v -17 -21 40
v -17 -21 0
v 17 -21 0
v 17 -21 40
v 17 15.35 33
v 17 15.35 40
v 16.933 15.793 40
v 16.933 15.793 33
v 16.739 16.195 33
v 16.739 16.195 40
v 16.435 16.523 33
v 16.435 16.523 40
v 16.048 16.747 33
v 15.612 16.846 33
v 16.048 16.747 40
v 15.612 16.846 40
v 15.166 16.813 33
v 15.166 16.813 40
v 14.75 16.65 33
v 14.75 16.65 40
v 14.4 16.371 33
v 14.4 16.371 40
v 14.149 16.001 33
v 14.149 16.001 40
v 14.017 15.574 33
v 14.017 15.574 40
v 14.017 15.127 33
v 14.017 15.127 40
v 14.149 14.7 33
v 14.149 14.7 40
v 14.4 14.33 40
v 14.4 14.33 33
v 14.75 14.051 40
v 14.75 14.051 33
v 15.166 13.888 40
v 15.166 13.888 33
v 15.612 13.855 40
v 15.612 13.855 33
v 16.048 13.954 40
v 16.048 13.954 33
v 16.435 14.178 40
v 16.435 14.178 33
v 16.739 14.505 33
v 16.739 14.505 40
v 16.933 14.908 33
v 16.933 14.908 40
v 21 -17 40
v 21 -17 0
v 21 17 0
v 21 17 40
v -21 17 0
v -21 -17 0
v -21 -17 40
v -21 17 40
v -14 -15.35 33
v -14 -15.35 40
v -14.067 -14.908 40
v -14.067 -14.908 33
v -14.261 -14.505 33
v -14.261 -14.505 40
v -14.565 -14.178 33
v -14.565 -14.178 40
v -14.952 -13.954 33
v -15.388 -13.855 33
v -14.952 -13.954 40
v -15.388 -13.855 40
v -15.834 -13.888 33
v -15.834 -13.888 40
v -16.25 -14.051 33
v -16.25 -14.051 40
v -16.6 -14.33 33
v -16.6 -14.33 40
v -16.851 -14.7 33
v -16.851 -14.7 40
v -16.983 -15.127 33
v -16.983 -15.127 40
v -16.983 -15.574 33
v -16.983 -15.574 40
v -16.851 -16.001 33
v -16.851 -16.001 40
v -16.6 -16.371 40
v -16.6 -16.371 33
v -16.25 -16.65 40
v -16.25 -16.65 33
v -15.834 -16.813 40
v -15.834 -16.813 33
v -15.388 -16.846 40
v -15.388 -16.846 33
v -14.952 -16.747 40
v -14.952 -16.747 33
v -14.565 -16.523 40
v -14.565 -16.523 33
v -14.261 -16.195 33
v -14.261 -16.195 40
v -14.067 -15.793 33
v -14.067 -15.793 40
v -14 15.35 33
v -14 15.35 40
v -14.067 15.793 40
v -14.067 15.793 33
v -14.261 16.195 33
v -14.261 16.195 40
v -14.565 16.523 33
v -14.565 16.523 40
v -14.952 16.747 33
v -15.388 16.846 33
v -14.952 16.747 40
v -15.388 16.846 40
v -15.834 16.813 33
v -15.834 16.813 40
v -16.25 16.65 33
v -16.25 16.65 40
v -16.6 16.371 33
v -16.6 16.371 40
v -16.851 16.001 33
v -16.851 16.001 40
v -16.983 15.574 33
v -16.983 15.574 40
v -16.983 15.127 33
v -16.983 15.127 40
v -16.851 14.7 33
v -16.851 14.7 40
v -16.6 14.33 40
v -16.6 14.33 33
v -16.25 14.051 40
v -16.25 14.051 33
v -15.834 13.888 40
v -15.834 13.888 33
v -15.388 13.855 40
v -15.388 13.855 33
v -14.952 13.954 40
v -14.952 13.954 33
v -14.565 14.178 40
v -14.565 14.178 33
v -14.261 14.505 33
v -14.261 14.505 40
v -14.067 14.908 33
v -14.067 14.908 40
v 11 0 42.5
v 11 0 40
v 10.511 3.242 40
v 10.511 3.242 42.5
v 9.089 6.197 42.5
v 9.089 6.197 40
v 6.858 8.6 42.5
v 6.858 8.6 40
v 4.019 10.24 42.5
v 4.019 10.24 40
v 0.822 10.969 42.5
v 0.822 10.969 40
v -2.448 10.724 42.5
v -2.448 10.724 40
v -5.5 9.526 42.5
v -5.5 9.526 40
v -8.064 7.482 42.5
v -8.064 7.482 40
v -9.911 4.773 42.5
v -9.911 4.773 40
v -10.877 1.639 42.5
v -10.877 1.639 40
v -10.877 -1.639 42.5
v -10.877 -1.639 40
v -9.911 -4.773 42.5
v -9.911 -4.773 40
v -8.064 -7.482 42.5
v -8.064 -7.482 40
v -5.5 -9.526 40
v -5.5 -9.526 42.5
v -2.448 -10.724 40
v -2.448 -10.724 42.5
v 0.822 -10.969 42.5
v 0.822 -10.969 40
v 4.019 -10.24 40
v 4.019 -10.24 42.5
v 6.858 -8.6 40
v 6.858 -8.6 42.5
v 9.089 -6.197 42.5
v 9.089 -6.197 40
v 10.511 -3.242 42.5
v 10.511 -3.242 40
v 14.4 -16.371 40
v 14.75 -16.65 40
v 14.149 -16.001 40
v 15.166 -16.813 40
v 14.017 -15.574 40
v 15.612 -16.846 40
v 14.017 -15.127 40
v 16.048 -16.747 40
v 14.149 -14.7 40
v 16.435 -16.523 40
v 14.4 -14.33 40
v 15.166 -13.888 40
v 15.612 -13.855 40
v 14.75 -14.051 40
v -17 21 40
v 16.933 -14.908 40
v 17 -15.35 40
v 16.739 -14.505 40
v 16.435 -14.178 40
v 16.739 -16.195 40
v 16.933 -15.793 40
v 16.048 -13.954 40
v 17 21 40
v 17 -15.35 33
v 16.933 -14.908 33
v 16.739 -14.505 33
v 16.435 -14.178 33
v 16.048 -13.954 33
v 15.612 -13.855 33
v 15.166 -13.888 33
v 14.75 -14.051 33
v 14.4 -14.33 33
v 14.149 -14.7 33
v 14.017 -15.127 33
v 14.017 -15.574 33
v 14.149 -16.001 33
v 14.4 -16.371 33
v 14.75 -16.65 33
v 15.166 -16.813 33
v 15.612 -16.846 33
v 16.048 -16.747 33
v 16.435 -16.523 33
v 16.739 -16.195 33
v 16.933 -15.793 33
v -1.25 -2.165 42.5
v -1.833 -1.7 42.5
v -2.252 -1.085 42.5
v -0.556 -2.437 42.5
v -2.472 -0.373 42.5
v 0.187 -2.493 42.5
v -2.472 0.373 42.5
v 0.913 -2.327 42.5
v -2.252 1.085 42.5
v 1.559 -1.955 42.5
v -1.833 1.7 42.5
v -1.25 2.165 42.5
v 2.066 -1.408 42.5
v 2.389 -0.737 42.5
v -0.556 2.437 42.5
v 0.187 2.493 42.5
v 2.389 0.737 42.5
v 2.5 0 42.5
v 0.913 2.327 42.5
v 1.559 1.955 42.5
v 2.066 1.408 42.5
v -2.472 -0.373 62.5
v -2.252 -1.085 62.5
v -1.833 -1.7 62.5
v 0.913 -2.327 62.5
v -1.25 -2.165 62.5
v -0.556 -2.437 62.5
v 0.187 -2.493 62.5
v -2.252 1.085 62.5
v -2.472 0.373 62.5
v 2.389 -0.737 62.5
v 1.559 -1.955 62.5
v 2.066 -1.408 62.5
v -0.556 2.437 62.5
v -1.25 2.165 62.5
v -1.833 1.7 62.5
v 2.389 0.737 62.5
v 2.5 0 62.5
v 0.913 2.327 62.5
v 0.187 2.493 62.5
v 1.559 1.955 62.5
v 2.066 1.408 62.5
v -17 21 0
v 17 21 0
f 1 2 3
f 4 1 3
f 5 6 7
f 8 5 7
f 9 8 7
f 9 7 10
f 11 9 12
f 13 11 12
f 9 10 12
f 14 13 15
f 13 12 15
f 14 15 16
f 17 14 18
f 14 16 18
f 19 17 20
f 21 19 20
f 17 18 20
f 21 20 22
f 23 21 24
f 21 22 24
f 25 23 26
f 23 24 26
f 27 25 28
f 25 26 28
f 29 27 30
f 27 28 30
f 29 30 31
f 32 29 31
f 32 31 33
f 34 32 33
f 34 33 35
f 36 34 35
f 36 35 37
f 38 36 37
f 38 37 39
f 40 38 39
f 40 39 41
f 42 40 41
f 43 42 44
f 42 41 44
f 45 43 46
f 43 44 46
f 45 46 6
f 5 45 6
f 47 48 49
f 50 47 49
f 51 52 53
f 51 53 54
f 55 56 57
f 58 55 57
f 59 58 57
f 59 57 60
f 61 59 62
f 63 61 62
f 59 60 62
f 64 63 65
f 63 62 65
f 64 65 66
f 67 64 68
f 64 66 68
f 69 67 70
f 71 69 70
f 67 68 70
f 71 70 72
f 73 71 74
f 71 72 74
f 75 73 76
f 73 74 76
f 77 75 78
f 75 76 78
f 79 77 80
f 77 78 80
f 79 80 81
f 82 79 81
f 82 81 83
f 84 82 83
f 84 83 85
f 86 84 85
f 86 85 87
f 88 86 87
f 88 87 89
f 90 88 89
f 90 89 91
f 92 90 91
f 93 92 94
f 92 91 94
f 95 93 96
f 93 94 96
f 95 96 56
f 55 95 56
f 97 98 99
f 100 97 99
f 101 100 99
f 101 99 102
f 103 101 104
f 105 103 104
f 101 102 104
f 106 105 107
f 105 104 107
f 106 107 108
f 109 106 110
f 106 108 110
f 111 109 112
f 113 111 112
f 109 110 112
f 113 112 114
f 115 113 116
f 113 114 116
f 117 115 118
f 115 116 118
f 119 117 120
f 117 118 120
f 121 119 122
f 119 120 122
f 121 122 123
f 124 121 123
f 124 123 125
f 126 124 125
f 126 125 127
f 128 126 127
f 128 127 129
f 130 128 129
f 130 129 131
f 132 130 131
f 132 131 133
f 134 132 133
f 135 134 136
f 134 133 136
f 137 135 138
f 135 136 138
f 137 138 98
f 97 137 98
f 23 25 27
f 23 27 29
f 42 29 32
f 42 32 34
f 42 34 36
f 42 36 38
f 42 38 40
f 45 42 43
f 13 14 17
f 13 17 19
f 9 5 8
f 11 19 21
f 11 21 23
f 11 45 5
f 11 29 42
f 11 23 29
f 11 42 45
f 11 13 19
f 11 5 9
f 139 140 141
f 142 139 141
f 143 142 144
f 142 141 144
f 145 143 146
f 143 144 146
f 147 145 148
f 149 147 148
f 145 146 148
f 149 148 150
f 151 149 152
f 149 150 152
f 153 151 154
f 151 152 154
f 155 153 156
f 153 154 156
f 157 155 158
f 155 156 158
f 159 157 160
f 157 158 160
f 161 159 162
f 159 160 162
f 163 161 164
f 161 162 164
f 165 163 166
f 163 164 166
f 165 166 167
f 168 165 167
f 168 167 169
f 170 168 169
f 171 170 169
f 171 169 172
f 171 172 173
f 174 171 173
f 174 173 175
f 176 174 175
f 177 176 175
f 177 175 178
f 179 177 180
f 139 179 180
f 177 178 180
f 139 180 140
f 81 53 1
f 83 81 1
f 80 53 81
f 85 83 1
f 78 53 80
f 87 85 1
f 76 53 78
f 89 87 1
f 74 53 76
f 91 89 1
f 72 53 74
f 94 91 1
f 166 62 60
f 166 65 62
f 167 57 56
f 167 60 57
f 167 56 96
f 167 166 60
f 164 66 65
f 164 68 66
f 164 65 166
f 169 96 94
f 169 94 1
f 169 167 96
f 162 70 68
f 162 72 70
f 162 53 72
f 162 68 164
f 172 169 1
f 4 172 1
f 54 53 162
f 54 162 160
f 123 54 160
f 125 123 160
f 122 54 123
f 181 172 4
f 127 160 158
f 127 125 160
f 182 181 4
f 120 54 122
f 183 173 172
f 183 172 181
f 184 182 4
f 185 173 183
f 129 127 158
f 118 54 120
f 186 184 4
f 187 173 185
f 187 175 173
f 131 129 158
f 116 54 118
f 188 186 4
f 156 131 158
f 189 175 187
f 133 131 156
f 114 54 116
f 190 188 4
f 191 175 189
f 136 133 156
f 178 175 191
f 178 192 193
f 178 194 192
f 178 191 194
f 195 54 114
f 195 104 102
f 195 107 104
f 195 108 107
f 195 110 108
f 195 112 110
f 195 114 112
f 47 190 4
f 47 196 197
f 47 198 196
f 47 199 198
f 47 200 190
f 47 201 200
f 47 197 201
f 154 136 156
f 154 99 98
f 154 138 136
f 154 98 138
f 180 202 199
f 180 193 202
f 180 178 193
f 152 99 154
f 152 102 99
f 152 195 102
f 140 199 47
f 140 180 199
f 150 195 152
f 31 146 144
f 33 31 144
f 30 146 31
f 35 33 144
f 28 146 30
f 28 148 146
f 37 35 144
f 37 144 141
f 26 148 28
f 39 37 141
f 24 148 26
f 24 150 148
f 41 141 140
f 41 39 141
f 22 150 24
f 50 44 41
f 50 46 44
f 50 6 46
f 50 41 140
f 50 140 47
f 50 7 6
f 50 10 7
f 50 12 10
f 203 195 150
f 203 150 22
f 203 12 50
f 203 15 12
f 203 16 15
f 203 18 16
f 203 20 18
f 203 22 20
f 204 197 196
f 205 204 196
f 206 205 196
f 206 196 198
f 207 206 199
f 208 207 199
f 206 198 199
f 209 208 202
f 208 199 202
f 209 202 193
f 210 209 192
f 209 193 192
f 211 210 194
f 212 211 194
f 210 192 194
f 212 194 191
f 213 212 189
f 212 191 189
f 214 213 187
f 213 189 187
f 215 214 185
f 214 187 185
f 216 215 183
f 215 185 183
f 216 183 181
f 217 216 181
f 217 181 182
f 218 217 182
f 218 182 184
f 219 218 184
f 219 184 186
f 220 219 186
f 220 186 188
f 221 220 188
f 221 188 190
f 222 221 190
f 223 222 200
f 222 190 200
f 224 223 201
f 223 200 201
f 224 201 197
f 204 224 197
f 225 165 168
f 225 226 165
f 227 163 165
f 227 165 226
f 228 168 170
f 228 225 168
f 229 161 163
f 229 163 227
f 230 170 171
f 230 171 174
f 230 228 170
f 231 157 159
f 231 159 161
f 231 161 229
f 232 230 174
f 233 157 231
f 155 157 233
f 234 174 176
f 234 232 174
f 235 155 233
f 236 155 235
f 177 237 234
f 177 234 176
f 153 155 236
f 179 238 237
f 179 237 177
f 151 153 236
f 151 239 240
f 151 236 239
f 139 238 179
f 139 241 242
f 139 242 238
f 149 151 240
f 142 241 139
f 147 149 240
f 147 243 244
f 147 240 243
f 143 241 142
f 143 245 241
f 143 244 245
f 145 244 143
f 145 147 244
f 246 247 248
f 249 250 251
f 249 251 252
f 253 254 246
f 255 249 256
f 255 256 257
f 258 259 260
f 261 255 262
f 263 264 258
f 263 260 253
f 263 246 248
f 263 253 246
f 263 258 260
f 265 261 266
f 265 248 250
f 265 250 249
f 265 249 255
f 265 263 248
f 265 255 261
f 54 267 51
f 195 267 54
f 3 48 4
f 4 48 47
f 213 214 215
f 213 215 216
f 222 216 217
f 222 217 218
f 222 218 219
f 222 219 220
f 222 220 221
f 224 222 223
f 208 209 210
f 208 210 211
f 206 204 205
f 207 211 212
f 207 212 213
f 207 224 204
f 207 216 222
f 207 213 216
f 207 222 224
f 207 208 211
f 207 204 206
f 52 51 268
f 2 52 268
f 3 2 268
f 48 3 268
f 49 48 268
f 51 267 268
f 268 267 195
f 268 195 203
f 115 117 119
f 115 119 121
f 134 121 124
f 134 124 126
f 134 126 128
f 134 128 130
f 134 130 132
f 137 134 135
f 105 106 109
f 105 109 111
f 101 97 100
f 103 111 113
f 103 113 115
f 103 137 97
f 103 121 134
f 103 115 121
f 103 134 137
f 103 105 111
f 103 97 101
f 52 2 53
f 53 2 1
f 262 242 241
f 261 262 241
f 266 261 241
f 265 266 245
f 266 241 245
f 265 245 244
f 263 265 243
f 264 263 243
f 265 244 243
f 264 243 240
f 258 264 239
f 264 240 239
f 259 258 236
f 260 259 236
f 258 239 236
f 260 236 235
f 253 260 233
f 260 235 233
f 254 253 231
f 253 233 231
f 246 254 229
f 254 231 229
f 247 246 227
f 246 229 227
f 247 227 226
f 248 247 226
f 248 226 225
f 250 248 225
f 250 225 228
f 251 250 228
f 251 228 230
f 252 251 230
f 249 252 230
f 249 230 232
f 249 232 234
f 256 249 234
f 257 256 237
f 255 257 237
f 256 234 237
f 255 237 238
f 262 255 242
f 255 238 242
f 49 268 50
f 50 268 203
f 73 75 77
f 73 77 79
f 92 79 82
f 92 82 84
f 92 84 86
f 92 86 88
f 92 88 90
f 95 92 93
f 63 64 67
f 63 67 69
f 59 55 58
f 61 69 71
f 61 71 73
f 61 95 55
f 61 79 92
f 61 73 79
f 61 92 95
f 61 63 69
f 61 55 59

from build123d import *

# Parameters (mm, degrees)
SKETCH_W     = 42
SKETCH_H     = 42
PAD_DEPTH    = 40
CHAMFER_SIZE = 4
SKETCH001_R  = 11
PAD001_DEPTH = 2.5
SKETCH002_R  = 2.5
PAD002_DEPTH = 20
SKETCH003_R  = 1.5
POCKET_DEPTH = 7


with BuildPart() as part:
    # Sketch → Pad (new body)
    with BuildSketch(Plane.XY):
        Rectangle(SKETCH_W, SKETCH_H)
    extrude(amount=PAD_DEPTH)

    # Chamfer
    chamfer_edges = [part.edges().sort_by_distance(p)[0] for p in [
        (21, -21, 20),
        (-21, -21, 20),
        (-21, 21, 20),
        (21, 21, 20),
    ]]
    chamfer(chamfer_edges, length=CHAMFER_SIZE)

    # Sketch001 (on Face5 of Chamfer) → Pad001 (join)
    with BuildSketch(Plane.XY.offset(40)):
        Circle(SKETCH001_R)
    extrude(amount=PAD001_DEPTH)

    # Sketch002 (on Face12 of Pad001) → Pad002 (join)
    with BuildSketch(Plane.XY.offset(42.5)):
        Circle(SKETCH002_R)
    extrude(amount=PAD002_DEPTH)

    # Sketch003 (on Face5 of Pad002) → Pocket (cut)
    with BuildSketch(Plane.XY.offset(40)):
        with Locations((-15.5, 15.350468)):
            Circle(SKETCH003_R)
        with Locations((15.5, 15.350468)):
            Circle(SKETCH003_R)
        with Locations((15.5, -15.350468)):
            Circle(SKETCH003_R)
        with Locations((-15.5, -15.350468)):
            Circle(SKETCH003_R)
    extrude(amount=-POCKET_DEPTH, mode=Mode.SUBTRACT)


solid = part.part
